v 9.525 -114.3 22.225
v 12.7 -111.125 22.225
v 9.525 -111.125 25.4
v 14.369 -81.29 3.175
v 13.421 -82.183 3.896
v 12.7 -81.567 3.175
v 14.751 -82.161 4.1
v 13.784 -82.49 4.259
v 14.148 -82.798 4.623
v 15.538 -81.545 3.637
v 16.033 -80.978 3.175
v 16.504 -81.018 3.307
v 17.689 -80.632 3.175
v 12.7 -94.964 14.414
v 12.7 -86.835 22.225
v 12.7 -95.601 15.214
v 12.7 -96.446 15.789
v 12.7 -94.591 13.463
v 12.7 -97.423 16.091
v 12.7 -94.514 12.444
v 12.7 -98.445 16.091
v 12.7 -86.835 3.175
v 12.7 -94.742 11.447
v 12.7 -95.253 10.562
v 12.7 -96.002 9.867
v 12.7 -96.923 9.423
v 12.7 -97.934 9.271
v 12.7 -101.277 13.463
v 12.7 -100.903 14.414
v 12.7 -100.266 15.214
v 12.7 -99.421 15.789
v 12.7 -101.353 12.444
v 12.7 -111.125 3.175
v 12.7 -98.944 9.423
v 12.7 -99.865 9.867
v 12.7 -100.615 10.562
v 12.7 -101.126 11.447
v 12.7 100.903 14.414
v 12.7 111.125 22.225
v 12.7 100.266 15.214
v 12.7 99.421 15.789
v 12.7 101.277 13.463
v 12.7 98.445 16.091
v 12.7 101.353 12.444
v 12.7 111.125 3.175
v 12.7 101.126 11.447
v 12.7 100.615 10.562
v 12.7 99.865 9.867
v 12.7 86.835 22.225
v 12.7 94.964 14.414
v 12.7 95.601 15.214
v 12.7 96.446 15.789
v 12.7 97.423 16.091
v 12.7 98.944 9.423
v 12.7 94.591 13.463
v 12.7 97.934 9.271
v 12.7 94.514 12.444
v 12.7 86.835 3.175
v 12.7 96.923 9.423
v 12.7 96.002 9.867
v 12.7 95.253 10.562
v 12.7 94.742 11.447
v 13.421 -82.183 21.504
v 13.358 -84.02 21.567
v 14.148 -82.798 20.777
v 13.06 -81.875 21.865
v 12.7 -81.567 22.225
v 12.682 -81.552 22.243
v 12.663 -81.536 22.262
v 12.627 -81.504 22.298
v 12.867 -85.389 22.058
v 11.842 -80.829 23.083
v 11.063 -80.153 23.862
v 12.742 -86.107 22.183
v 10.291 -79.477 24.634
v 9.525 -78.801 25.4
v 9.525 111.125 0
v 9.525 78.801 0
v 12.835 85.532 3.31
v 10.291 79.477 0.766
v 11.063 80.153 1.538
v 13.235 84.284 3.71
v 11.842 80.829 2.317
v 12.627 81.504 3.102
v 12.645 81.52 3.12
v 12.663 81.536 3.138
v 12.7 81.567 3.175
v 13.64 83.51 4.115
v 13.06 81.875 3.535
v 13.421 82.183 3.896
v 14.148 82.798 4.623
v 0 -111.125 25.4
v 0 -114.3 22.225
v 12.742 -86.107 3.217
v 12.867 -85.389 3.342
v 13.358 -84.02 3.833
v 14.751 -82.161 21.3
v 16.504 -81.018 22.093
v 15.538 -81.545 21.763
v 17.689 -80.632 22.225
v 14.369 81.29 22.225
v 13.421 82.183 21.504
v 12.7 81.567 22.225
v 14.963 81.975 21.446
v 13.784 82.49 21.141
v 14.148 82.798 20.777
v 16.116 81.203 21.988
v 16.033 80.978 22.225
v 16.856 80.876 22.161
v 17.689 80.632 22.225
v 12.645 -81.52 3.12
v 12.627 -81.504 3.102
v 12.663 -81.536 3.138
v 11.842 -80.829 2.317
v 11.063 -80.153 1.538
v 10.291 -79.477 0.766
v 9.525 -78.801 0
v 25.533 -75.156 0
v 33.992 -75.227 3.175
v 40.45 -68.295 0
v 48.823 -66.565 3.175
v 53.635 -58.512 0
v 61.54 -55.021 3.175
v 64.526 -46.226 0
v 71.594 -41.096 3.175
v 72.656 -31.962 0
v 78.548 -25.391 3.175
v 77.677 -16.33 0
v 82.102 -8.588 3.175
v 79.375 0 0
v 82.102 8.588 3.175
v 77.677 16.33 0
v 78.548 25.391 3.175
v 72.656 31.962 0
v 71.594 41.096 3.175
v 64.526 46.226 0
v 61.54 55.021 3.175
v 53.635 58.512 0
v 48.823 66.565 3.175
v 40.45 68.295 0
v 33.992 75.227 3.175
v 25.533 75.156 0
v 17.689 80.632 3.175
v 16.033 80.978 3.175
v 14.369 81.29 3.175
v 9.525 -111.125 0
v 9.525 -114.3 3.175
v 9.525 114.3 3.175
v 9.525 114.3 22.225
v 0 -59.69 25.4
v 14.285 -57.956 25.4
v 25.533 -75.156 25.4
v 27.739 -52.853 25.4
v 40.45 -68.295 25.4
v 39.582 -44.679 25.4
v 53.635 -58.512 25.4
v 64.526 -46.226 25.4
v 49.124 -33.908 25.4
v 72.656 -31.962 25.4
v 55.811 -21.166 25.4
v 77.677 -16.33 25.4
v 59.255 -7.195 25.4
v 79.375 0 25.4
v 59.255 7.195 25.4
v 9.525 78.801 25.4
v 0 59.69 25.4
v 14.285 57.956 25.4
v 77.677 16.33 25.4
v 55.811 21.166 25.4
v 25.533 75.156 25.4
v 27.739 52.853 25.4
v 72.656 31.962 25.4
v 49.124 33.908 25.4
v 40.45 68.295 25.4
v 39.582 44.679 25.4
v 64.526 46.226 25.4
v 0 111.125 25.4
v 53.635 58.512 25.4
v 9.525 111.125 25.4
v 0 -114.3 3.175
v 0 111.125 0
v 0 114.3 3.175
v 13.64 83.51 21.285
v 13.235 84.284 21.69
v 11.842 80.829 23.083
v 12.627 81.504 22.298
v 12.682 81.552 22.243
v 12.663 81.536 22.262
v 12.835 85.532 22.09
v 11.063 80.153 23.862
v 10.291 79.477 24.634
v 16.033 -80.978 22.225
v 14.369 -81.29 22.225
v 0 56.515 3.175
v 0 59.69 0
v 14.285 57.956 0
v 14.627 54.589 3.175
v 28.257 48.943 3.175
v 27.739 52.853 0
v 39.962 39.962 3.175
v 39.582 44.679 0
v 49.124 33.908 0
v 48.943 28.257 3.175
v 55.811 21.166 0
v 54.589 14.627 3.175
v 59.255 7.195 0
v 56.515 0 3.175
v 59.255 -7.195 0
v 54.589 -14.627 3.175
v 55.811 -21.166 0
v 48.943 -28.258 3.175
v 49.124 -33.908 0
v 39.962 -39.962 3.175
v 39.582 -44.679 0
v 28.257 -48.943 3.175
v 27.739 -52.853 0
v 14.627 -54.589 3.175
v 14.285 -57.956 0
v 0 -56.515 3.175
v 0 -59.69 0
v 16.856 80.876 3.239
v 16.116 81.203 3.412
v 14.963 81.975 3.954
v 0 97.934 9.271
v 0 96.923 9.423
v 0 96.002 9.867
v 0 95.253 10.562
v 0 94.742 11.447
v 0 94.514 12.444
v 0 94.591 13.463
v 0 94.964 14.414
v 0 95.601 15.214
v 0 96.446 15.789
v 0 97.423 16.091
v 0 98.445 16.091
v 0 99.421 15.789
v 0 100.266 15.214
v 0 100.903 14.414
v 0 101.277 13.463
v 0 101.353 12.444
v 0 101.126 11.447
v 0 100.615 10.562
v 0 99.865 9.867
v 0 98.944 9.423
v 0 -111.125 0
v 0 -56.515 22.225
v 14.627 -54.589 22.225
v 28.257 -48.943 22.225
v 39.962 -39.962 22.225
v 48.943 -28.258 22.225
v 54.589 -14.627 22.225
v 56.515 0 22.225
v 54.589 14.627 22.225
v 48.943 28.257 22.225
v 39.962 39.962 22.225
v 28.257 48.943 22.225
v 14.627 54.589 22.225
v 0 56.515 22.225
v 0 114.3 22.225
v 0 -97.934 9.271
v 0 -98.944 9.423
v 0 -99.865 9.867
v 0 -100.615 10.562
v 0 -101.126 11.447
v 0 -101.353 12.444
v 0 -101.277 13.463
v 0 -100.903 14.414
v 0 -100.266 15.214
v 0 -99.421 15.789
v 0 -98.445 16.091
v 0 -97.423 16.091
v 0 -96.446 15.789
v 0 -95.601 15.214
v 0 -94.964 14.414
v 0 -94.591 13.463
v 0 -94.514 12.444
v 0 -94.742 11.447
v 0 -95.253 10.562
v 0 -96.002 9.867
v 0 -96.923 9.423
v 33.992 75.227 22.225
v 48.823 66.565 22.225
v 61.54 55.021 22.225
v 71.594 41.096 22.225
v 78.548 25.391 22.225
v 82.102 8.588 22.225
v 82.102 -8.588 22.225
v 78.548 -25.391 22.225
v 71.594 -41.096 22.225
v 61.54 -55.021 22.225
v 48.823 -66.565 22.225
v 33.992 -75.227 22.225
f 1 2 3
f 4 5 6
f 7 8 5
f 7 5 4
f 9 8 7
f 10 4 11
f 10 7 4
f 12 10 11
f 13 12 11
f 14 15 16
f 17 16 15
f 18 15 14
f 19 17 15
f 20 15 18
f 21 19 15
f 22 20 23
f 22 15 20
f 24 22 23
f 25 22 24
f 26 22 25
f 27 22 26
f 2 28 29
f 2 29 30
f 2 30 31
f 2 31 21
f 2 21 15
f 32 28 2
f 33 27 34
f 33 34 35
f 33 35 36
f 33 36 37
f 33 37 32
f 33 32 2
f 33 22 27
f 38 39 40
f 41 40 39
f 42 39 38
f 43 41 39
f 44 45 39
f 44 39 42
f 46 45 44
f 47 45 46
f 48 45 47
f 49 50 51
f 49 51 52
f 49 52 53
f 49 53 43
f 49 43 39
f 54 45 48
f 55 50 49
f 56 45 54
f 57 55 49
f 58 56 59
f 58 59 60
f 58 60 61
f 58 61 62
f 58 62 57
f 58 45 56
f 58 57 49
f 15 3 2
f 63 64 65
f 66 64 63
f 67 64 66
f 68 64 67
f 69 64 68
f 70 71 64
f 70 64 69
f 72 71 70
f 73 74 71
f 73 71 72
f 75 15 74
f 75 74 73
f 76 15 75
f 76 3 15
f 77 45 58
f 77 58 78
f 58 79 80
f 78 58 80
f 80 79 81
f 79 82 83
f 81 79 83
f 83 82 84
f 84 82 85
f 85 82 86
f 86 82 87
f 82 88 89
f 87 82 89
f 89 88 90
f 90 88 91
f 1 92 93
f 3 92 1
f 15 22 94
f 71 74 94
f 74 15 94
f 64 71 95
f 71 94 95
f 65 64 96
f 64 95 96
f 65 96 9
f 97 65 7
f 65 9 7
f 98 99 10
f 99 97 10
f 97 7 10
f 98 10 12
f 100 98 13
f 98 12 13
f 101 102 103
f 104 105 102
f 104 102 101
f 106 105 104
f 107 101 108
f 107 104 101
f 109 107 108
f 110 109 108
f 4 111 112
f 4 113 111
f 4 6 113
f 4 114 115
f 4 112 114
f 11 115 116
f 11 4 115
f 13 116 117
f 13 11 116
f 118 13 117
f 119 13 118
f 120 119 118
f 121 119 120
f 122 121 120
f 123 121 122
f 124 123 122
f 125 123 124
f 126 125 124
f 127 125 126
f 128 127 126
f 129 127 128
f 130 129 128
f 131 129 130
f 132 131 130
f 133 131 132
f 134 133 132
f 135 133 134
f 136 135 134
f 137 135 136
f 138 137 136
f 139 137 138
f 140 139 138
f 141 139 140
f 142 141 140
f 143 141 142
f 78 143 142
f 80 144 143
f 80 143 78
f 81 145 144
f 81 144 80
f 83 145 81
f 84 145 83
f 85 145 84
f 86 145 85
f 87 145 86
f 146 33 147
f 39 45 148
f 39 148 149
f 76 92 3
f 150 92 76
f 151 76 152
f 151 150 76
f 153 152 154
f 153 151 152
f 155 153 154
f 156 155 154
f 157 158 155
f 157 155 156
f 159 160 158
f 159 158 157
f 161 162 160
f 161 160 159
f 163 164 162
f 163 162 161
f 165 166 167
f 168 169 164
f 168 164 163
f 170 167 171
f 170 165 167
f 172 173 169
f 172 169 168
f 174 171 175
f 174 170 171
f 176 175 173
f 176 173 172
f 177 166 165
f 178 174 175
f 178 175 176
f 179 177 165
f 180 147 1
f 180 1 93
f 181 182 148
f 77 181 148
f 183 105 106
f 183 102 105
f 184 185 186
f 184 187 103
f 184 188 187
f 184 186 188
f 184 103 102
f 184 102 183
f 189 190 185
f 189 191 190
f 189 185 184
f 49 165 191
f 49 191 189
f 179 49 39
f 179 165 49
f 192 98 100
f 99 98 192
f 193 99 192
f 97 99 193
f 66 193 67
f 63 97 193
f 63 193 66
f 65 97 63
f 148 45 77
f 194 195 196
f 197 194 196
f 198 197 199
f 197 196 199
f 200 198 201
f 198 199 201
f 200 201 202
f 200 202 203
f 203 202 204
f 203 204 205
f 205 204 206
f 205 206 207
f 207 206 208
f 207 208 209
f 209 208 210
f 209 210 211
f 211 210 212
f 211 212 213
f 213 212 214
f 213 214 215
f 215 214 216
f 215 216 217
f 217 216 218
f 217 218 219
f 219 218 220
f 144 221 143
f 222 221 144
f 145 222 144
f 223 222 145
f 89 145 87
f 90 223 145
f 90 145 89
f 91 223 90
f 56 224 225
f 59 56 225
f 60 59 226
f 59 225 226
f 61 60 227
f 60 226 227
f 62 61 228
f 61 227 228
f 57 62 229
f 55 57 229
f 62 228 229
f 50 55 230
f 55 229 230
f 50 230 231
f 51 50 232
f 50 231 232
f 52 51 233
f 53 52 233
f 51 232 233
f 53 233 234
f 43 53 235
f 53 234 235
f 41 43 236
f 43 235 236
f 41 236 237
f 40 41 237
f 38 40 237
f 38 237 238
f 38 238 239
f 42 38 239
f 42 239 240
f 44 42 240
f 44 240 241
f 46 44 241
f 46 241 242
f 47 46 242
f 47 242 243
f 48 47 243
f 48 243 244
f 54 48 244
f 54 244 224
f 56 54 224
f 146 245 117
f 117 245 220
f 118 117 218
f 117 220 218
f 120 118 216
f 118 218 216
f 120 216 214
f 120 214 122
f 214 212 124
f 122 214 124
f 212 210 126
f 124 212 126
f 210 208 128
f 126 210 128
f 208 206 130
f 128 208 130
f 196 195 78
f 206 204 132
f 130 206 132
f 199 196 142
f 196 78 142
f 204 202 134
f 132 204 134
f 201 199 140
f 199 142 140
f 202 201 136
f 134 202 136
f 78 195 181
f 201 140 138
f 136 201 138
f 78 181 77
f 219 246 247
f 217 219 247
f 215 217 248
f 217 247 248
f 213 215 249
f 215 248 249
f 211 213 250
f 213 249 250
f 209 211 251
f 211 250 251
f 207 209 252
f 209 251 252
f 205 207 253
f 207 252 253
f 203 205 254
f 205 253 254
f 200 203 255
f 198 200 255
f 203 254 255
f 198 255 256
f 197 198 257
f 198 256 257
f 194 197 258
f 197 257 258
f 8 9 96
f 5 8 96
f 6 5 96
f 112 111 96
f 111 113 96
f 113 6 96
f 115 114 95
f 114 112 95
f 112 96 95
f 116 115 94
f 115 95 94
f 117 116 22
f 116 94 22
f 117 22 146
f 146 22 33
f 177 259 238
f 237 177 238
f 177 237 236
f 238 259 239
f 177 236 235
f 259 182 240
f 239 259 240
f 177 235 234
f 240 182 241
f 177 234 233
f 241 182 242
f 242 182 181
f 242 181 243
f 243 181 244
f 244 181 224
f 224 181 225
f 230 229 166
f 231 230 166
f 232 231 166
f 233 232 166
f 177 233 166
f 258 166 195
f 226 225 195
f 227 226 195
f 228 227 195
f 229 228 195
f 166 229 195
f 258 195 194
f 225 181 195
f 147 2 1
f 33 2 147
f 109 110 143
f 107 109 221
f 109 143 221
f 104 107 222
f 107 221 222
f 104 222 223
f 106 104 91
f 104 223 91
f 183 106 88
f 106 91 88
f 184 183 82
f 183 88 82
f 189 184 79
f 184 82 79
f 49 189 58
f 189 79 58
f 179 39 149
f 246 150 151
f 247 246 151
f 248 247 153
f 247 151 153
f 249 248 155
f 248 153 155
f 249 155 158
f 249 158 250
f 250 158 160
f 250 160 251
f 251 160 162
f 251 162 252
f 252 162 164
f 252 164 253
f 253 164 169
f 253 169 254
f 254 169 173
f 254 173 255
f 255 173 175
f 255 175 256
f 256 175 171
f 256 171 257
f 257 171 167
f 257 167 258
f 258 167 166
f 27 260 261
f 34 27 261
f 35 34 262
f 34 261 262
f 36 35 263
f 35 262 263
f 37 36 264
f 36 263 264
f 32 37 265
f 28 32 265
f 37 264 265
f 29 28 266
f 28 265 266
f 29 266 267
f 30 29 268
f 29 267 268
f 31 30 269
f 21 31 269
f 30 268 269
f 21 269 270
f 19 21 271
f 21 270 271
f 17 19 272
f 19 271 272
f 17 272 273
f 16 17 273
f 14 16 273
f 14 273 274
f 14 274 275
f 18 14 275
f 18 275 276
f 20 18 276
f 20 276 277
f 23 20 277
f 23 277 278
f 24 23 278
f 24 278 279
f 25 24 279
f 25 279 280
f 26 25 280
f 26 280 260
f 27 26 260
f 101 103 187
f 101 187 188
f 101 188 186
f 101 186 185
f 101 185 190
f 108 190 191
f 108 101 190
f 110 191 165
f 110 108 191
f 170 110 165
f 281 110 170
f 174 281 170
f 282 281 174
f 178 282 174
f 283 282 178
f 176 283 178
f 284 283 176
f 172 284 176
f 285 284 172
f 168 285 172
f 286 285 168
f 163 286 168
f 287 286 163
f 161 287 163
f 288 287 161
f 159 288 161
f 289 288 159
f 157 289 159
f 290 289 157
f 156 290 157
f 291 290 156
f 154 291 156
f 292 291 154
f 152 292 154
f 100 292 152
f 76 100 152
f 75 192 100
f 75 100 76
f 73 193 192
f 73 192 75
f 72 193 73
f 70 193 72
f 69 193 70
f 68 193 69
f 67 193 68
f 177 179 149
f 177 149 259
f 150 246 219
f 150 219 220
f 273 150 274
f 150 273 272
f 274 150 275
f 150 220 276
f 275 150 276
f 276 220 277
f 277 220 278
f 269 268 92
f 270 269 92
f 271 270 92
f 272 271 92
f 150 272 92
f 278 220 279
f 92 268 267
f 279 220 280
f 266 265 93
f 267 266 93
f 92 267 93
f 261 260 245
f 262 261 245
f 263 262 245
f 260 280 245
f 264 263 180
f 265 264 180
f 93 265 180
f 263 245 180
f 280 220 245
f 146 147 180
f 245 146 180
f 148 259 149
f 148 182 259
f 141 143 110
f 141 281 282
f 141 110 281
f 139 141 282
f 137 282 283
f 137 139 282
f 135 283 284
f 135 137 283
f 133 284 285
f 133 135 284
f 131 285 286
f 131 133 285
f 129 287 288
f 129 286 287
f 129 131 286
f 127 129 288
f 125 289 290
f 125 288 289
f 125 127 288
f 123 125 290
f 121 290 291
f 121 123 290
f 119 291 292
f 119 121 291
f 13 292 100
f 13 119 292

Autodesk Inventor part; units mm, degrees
ref_plane "YZ Plane" through (0, 0, 0) normal (1, 0, 0) x (0, 1, 0)
ref_plane "XZ Plane" through (0, 0, 0) normal (0, 1, 0) x (-1, 0, 0)
ref_plane "XY Plane" through (0, 0, 0) normal (0, 0, 1) x (1, 0, 0)
sketch "Sketch1" plane through (0, 0, 0) normal (0, 0, 1) x (1, 0, 0)
  circle A0 centre (0, 0) radius 56.515
  line L0 (12.7, -114.3) -> (-12.7, -114.3)
  line L1 (-12.7, 114.3) -> (12.7, 114.3)
  line L2 (12.7, 114.3) -> (-12.7, -114.3) construction
  line L3 (12.7, -114.3) -> (-12.7, 114.3) construction
  line L4 (12.7, -81.5672) -> (12.7, -114.3)
  line L5 (-12.7, -114.3) -> (-12.7, -81.5672)
  line L6 (12.7, 114.3) -> (12.7, 81.5672)
  arc A1 (12.7, -81.5672) -> (12.7, 81.5672) centre (0, 0) ccw
  arc A2 (-12.7, 81.5672) -> (-12.7, -81.5672) centre (0, 0) ccw
  line L7 (-12.7, 81.5672) -> (-12.7, 114.3)
  line L8 (0, 114.3) -> (0, -114.3)
  line L9 (-0.7937, -114.3) -> (0.7937, -114.3)
  line L10 (0.7937, -114.3) -> (0.7937, 114.3)
  line L11 (0.7937, 114.3) -> (-0.7937, 114.3)
  line L12 (-0.7937, 114.3) -> (-0.7937, -114.3)
  line L13 (-0.7937, -114.3) -> (0.7937, 114.3) construction
  line L14 (0.7937, -114.3) -> (-0.7937, 114.3) construction
  dimension "d0" = 113.03
  dimension "d1" = 228.6
  dimension "d2" = 25.4
  dimension "d3" = 82.55
  dimension "d4" = 82.55
  dimension "d5" = 32.7328
  dimension "d6" = 32.7328
  dimension "d7" = 1.5875
extrude "Extrusion1" add sketch "Sketch1" along normal blind 25.4 contours A0 L10 | A0 L10 L1 L6 A1 L4 L0 | L10 A0 L8 | A0 L8 L1 L10 | L10 L0 L8 A0
sketch "Sketch2" plane through (0, 0, 25.4) normal (0, 0, 1) x (1, 0, 0)
  arc A0 (12.7, -81.5672) -> (12.7, 81.5672) centre (0, 0) ccw projected
  circle A1 centre (0, 0) radius 56.515
  dimension "d10" = 113.03
extrude "Extrusion2" cut sketch "Sketch2" against normal blind 25.4
sketch "Sketch3" plane through (12.7, 81.5672, 0) normal (1, 0, 0) x (0, 0, -1)
  line L0 (-25.4, 32.7328) -> (0, 0) construction
  line L1 (0, -138.0822) -> (0, -195.8672) projected
  line L2 (-25.4, -163.1345) -> (0, -195.8672) construction
  point P0 (0, -81.5672)
  point P1 (-12.7, -179.5008)
  point P2 (-12.7, 16.3664)
hole "Hole1" at (12.7, -97.9336, 12.7) at (12.7, 97.9336, 12.7) direction (-1, 0, 0) diameter 6.858 depth 15.6718 tip angle 118 clearance for "Flat Head Machine Screw (82)" size "1/4" standard "Ansi Unified Screw Threads"
chamfer "Chamfer1" distance 3.175 angle 45 14 edges at (56.515, 0, 25.4) (56.515, 0, 0) (82.55, 0, 0) (82.55, 0, 25.4) (12.7, 97.9336, 25.4) (12.7, 114.3, 12.7) (12.7, 97.9336, 0) (12.7, -97.9336, 0) (12.7, -97.9336, 25.4) (12.7, -114.3, 12.7) (6.35, -114.3, 25.4) (6.35, -114.3, 0) (6.35, 114.3, 25.4) (6.35, 114.3, 0)
fillet "Fillet1" radius 6.35 2 edges at (12.7, -81.5672, 12.7) (12.7, 81.5672, 12.7)
equation "\"d4\" = d3"
equation "\"d6\" = d5"
properties part number "2122_Copper Tube Clamp Top_V1" material "ABS Plastic"
